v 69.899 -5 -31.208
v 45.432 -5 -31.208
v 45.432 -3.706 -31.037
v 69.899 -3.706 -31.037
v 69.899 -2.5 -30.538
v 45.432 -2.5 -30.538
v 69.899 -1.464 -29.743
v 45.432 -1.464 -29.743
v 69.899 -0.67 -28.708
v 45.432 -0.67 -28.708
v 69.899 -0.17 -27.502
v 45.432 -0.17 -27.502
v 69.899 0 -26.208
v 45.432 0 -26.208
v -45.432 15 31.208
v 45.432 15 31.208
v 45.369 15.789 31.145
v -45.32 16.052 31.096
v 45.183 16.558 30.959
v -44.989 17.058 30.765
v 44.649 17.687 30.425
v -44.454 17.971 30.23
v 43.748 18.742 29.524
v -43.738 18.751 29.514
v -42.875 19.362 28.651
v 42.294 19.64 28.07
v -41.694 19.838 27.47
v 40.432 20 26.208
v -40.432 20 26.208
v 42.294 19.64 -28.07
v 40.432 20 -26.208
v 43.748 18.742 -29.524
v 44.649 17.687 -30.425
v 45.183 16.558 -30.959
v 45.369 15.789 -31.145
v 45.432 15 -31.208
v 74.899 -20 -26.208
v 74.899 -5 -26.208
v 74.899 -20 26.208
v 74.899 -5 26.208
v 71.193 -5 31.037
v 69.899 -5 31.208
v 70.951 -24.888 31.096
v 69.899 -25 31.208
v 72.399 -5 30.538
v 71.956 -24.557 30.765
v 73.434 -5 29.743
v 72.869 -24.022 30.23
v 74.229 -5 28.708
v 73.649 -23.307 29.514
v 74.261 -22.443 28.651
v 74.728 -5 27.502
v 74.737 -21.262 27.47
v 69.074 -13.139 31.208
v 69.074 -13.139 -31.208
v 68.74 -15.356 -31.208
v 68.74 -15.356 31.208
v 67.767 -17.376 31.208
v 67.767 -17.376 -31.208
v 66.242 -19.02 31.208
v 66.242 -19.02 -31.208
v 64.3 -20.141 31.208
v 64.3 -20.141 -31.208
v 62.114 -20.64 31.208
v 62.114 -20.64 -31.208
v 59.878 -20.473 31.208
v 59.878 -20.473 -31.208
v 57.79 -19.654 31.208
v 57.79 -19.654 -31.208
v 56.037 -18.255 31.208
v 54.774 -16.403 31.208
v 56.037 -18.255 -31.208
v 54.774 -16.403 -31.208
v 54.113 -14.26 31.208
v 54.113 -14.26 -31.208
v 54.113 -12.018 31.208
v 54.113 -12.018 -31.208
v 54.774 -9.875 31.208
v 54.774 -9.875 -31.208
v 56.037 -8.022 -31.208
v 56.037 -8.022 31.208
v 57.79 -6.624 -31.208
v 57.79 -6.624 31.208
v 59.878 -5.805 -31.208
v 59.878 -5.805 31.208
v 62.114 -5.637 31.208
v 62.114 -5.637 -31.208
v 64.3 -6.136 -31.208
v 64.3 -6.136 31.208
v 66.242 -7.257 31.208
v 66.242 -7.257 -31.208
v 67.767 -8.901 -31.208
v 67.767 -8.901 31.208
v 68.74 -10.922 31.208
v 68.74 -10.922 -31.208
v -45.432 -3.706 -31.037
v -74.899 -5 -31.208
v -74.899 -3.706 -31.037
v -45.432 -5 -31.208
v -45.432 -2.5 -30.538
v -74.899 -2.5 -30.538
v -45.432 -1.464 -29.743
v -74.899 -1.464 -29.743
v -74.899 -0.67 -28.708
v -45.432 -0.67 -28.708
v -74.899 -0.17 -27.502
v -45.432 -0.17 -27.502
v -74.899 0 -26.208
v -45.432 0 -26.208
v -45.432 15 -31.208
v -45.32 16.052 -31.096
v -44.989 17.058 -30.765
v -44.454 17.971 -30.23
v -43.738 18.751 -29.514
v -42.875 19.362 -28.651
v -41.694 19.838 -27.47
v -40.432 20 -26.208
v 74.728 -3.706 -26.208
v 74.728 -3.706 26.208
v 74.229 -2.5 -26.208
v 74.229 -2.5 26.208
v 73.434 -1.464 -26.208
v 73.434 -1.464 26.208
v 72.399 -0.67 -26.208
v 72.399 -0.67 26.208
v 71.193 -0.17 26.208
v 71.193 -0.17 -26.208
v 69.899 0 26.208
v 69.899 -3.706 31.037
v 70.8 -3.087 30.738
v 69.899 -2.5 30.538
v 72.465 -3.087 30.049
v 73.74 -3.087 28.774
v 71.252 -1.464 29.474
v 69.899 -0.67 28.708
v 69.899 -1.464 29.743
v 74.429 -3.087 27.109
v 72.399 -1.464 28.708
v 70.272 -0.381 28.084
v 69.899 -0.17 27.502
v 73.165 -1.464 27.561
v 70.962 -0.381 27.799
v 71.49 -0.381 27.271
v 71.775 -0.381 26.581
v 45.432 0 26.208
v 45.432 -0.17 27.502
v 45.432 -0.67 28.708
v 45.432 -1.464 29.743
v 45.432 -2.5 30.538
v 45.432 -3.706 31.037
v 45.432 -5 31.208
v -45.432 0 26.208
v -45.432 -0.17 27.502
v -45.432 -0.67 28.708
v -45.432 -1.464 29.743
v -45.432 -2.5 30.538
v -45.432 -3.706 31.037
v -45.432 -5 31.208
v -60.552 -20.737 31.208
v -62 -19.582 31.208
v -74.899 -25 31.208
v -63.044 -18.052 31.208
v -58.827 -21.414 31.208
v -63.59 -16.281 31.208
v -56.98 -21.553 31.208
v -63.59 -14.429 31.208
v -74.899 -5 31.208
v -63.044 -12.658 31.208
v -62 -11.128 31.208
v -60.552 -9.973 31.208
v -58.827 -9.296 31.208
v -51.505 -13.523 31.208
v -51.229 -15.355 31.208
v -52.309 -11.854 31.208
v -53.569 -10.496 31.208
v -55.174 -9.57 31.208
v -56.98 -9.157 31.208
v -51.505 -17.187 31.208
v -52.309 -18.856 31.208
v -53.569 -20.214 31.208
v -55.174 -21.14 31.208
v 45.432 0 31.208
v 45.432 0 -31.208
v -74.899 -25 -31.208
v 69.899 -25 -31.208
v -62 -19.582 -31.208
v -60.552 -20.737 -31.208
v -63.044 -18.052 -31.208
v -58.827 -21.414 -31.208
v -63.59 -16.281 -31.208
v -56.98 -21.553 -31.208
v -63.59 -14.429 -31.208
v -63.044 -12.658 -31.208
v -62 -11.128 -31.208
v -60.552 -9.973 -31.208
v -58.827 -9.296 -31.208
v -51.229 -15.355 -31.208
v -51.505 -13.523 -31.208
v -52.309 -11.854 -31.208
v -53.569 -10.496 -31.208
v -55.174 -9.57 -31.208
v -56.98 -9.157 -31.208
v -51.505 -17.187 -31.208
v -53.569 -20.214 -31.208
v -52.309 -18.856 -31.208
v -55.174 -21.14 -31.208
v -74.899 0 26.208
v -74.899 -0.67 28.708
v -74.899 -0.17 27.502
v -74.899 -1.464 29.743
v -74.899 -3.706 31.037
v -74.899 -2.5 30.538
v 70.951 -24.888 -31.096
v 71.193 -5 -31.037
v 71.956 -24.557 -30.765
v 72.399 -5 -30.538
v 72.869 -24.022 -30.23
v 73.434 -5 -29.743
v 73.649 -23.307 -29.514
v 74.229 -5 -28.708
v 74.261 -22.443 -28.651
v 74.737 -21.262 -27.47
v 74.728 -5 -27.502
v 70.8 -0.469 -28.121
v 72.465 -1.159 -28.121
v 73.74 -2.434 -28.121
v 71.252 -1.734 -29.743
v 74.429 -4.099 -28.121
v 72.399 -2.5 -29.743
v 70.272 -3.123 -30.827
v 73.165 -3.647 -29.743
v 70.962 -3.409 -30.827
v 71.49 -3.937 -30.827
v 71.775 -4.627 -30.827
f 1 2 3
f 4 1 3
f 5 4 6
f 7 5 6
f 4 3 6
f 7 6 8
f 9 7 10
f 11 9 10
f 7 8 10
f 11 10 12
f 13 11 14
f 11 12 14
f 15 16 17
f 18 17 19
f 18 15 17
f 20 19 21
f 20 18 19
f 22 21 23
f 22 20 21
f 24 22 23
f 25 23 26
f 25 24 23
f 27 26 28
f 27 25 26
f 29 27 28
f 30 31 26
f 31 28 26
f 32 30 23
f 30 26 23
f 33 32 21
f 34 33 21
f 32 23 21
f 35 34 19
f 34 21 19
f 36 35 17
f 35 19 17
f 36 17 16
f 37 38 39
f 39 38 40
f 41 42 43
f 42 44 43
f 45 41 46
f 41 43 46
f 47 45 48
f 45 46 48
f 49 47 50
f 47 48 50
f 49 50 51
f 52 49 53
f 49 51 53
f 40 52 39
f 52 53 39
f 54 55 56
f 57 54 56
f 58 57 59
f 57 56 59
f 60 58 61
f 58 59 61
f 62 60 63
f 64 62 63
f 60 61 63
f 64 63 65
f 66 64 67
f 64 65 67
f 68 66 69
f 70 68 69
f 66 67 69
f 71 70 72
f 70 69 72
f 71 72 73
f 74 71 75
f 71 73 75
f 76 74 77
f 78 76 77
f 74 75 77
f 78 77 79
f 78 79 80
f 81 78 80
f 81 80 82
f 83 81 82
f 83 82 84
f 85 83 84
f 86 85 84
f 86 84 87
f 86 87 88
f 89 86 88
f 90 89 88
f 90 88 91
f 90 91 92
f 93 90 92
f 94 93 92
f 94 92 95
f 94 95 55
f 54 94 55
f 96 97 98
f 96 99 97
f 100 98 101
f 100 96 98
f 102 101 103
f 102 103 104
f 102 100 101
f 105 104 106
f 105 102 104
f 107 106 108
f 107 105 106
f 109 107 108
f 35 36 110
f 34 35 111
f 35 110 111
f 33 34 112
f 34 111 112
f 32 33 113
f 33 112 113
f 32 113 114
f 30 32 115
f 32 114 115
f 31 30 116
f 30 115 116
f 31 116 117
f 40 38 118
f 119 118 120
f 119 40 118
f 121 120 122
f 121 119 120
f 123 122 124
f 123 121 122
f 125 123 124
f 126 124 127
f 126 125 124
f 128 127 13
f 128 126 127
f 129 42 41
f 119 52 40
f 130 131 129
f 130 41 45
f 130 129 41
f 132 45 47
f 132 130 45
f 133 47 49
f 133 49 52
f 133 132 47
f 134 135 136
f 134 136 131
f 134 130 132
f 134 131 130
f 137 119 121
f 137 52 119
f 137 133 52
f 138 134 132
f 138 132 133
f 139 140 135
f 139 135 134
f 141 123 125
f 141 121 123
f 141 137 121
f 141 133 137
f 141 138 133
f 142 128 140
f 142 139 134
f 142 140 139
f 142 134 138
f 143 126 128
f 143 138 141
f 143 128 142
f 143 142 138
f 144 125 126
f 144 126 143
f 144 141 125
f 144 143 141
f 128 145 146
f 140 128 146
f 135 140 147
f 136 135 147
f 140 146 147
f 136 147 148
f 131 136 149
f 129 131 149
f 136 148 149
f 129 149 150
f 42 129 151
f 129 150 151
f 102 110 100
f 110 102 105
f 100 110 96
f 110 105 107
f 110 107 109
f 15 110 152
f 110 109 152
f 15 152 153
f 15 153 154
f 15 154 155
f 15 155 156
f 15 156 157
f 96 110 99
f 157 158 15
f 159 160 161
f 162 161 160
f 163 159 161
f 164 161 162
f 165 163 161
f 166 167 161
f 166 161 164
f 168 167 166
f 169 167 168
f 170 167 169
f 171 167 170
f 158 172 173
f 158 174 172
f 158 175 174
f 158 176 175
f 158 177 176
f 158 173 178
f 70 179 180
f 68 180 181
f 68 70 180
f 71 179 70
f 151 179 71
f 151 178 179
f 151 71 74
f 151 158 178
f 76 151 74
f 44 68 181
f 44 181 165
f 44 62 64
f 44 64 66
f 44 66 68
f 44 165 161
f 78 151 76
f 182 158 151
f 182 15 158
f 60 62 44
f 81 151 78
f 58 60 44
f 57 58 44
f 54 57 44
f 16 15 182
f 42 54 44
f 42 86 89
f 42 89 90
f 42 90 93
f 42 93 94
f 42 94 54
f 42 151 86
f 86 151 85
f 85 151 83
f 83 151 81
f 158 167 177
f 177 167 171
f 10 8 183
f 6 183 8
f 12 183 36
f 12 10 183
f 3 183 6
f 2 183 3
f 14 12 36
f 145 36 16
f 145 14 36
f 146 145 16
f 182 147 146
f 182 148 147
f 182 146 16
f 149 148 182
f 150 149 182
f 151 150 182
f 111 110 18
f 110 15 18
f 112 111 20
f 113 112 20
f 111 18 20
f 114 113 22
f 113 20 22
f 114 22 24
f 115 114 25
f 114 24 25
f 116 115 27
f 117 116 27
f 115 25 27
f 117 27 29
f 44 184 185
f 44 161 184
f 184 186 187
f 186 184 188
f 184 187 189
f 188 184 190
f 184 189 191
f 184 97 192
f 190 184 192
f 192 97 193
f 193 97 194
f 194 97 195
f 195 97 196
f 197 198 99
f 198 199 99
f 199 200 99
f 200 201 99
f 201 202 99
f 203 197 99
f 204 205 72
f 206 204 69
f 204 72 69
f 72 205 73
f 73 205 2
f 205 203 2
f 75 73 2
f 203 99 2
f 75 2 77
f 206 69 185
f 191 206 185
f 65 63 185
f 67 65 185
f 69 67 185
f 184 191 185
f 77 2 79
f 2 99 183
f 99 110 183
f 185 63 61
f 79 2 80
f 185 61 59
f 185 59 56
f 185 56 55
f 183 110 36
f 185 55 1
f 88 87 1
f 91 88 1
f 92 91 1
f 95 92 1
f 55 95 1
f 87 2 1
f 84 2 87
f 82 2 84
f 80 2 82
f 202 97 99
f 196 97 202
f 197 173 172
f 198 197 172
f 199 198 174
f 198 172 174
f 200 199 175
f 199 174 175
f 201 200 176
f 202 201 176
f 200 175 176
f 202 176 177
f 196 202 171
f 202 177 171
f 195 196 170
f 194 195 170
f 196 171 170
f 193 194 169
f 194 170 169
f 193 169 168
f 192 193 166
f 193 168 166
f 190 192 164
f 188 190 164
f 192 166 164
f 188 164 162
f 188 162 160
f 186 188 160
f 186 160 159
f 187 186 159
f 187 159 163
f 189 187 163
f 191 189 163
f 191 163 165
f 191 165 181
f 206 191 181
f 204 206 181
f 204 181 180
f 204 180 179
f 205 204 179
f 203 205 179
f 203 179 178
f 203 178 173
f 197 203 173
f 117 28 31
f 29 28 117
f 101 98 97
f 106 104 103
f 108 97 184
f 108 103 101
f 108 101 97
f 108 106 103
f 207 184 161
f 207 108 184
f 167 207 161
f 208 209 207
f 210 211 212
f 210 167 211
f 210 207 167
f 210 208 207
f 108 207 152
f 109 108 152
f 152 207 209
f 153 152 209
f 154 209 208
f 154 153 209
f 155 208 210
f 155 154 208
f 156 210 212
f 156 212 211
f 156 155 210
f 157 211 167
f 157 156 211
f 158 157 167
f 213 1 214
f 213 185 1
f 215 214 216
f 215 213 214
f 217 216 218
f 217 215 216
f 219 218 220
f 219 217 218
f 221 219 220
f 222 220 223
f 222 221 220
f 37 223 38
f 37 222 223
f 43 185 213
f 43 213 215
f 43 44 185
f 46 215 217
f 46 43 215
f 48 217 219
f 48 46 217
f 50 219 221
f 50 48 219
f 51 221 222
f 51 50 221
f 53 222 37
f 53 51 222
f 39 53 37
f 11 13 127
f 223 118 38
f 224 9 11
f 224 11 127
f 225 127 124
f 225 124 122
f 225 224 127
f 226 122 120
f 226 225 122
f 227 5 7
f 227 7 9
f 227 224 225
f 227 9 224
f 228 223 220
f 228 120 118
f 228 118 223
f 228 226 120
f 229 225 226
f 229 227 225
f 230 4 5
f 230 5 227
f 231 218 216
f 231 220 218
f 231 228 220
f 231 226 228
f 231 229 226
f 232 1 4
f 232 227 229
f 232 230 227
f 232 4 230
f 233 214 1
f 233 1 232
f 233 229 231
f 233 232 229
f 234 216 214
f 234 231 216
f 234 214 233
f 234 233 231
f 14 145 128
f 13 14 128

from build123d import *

# Parameters (mm, degrees)
F0_W         = 149.7976481915
F0_H         = 62.41568923
F1_DEPTH     = 25
F2_W         = 90.8637270331
F2_H         = 62.41568923
F3_DEPTH     = 20
F4_R         = 7.5225312021
F5_DEPTH     = 100
F6_R         = 6.2150283999
F7_DEPTH     = 100
F8_R         = 5
F9_T1_DEPTH  = 24.4669605792
F9_S5_W      = 5
F9_S5_H      = 5
F9_T6_DEPTH  = 5
F9_S11_W     = 5
F9_S11_H     = 5
F9_T12_DEPTH = 5
F10_R        = 5


# Not quite as in the source:
# - a fillet or chamfer that OpenCascade refuses, or shapes differently, is made with other operations: its cross-section is extruded or revolved along the edge and cut away or added


with BuildPart() as f1:
    # F0 (on Front) → F1 (new body)
    with BuildSketch(Plane.XZ):
        Rectangle(F0_W, F0_H)
    extrude(amount=F1_DEPTH)

    # F2 (on face) → F3 (join)
    with BuildSketch(Plane(origin=(0, 0, 0), x_dir=(-1, 0, 0), z_dir=(0, 1, 0))):
        Rectangle(F2_W, F2_H)
    extrude(amount=F3_DEPTH)

    # F4 (on face) → F5 (cut)
    with BuildSketch(Plane(origin=(0, 0, -31.207844615), x_dir=(1, 0, 0), z_dir=(0, 0, -1))):
        with Locations((61.5517050582, 13.1388221845)):
            Circle(F4_R)
    extrude(amount=-F5_DEPTH, mode=Mode.SUBTRACT)

    # F6 (on face) → F7 (cut)
    with BuildSketch(Plane.XY.offset(31.207844615)):
        with Locations((-57.4441173465, -15.3550794757)):
            Circle(F6_R)
    extrude(amount=-F7_DEPTH, mode=Mode.SUBTRACT)

    # F8
    f8_edges = [f1.edges().sort_by_distance(p)[0] for p in [
        (45.431864, 20, 0),
        (-45.431864, 20, 0),
        (74.898824, -12.5, -31.207845),
        (74.898824, -12.5, 31.207845),
        (74.898824, 0, 0),
        (74.898824, -25, 0),
        (0, 20, 31.207845),
        (0, 20, -31.207845),
    ]]
    fillet(f8_edges, radius=F8_R)

    # F9: fillet of radius 5 on 2 edges, made by hand

    # F9_s2 → F9_t1 (cut)
    with BuildSketch(Plane.YZ.offset(45.4318635166)):
        with BuildLine():
            ThreePointArc((-5, -31.207844615), (-1.4644660941, -29.7433785209), (0, -26.207844615))
            Line((0, -26.207844615), (0, -31.207844615))
            Line((0, -31.207844615), (-5, -31.207844615))
        make_face()
        with BuildLine():
            ThreePointArc((0, 26.207844615), (-1.4644660941, 29.7433785209), (-5, 31.207844615))
            Line((-5, 31.207844615), (0, 31.207844615))
            Line((0, 31.207844615), (0, 26.207844615))
        make_face()
    extrude(amount=F9_T1_DEPTH, mode=Mode.SUBTRACT)


with BuildPart() as f9_tool4:
    # F9_s5 → F9_t6 (new body)
    with BuildSketch(Plane.XZ.offset(5)):
        with Locations((72.3988240957, 28.707844615)):
            Rectangle(F9_S5_W, F9_S5_H)
    extrude(amount=-F9_T6_DEPTH)

    # F9_s7 → F9_t8 (revolve, cut)
    with BuildSketch(Plane(origin=(69.8988240957, -5, 26.207844615), x_dir=(-0.7071067812, 0, -0.7071067812), z_dir=(0.7071067812, 0, -0.7071067812))):
        with BuildLine():
            ThreePointArc((0, -5), (5, 0), (0, 5))
            Line((0, 5), (0, -5))
        make_face()
    revolve(axis=Axis((69.8988240957, -5, 26.207844615), (0, 1, 0)), mode=Mode.SUBTRACT)


with BuildPart() as f1_1:
    add(f1.part)

    # F9_t3: cut F9_tool4
    add(f9_tool4.part, mode=Mode.SUBTRACT)


with BuildPart() as f9_tool10:
    # F9_s11 → F9_t12 (new body)
    with BuildSketch(Plane.XY.offset(-26.207844615)):
        with Locations((72.3988240957, -2.5)):
            Rectangle(F9_S11_W, F9_S11_H)
    extrude(amount=-F9_T12_DEPTH)

    # F9_s13 → F9_t14 (revolve, cut)
    with BuildSketch(Plane(origin=(69.8988240957, -5, -26.207844615), x_dir=(-0.7071067812, -0.7071067812, 0), z_dir=(0.7071067812, -0.7071067812, 0))):
        with BuildLine():
            ThreePointArc((0, -5), (5, 0), (0, 5))
            Line((0, 5), (0, -5))
        make_face()
    revolve(axis=Axis((69.8988240957, -5, -26.207844615), (0, 0, -1)), mode=Mode.SUBTRACT)


with BuildPart() as f1_2:
    add(f1_1.part)

    # F9_t9: cut F9_tool10
    add(f9_tool10.part, mode=Mode.SUBTRACT)

    # F10
    f10_edges = [f1_2.edges().sort_by_distance(p)[0] for p in [
        (-60.165344, 0, -31.207845),
        (-60.165344, 0, 31.207845),
    ]]
    fillet(f10_edges, radius=F10_R)


solid = f1_2.part
